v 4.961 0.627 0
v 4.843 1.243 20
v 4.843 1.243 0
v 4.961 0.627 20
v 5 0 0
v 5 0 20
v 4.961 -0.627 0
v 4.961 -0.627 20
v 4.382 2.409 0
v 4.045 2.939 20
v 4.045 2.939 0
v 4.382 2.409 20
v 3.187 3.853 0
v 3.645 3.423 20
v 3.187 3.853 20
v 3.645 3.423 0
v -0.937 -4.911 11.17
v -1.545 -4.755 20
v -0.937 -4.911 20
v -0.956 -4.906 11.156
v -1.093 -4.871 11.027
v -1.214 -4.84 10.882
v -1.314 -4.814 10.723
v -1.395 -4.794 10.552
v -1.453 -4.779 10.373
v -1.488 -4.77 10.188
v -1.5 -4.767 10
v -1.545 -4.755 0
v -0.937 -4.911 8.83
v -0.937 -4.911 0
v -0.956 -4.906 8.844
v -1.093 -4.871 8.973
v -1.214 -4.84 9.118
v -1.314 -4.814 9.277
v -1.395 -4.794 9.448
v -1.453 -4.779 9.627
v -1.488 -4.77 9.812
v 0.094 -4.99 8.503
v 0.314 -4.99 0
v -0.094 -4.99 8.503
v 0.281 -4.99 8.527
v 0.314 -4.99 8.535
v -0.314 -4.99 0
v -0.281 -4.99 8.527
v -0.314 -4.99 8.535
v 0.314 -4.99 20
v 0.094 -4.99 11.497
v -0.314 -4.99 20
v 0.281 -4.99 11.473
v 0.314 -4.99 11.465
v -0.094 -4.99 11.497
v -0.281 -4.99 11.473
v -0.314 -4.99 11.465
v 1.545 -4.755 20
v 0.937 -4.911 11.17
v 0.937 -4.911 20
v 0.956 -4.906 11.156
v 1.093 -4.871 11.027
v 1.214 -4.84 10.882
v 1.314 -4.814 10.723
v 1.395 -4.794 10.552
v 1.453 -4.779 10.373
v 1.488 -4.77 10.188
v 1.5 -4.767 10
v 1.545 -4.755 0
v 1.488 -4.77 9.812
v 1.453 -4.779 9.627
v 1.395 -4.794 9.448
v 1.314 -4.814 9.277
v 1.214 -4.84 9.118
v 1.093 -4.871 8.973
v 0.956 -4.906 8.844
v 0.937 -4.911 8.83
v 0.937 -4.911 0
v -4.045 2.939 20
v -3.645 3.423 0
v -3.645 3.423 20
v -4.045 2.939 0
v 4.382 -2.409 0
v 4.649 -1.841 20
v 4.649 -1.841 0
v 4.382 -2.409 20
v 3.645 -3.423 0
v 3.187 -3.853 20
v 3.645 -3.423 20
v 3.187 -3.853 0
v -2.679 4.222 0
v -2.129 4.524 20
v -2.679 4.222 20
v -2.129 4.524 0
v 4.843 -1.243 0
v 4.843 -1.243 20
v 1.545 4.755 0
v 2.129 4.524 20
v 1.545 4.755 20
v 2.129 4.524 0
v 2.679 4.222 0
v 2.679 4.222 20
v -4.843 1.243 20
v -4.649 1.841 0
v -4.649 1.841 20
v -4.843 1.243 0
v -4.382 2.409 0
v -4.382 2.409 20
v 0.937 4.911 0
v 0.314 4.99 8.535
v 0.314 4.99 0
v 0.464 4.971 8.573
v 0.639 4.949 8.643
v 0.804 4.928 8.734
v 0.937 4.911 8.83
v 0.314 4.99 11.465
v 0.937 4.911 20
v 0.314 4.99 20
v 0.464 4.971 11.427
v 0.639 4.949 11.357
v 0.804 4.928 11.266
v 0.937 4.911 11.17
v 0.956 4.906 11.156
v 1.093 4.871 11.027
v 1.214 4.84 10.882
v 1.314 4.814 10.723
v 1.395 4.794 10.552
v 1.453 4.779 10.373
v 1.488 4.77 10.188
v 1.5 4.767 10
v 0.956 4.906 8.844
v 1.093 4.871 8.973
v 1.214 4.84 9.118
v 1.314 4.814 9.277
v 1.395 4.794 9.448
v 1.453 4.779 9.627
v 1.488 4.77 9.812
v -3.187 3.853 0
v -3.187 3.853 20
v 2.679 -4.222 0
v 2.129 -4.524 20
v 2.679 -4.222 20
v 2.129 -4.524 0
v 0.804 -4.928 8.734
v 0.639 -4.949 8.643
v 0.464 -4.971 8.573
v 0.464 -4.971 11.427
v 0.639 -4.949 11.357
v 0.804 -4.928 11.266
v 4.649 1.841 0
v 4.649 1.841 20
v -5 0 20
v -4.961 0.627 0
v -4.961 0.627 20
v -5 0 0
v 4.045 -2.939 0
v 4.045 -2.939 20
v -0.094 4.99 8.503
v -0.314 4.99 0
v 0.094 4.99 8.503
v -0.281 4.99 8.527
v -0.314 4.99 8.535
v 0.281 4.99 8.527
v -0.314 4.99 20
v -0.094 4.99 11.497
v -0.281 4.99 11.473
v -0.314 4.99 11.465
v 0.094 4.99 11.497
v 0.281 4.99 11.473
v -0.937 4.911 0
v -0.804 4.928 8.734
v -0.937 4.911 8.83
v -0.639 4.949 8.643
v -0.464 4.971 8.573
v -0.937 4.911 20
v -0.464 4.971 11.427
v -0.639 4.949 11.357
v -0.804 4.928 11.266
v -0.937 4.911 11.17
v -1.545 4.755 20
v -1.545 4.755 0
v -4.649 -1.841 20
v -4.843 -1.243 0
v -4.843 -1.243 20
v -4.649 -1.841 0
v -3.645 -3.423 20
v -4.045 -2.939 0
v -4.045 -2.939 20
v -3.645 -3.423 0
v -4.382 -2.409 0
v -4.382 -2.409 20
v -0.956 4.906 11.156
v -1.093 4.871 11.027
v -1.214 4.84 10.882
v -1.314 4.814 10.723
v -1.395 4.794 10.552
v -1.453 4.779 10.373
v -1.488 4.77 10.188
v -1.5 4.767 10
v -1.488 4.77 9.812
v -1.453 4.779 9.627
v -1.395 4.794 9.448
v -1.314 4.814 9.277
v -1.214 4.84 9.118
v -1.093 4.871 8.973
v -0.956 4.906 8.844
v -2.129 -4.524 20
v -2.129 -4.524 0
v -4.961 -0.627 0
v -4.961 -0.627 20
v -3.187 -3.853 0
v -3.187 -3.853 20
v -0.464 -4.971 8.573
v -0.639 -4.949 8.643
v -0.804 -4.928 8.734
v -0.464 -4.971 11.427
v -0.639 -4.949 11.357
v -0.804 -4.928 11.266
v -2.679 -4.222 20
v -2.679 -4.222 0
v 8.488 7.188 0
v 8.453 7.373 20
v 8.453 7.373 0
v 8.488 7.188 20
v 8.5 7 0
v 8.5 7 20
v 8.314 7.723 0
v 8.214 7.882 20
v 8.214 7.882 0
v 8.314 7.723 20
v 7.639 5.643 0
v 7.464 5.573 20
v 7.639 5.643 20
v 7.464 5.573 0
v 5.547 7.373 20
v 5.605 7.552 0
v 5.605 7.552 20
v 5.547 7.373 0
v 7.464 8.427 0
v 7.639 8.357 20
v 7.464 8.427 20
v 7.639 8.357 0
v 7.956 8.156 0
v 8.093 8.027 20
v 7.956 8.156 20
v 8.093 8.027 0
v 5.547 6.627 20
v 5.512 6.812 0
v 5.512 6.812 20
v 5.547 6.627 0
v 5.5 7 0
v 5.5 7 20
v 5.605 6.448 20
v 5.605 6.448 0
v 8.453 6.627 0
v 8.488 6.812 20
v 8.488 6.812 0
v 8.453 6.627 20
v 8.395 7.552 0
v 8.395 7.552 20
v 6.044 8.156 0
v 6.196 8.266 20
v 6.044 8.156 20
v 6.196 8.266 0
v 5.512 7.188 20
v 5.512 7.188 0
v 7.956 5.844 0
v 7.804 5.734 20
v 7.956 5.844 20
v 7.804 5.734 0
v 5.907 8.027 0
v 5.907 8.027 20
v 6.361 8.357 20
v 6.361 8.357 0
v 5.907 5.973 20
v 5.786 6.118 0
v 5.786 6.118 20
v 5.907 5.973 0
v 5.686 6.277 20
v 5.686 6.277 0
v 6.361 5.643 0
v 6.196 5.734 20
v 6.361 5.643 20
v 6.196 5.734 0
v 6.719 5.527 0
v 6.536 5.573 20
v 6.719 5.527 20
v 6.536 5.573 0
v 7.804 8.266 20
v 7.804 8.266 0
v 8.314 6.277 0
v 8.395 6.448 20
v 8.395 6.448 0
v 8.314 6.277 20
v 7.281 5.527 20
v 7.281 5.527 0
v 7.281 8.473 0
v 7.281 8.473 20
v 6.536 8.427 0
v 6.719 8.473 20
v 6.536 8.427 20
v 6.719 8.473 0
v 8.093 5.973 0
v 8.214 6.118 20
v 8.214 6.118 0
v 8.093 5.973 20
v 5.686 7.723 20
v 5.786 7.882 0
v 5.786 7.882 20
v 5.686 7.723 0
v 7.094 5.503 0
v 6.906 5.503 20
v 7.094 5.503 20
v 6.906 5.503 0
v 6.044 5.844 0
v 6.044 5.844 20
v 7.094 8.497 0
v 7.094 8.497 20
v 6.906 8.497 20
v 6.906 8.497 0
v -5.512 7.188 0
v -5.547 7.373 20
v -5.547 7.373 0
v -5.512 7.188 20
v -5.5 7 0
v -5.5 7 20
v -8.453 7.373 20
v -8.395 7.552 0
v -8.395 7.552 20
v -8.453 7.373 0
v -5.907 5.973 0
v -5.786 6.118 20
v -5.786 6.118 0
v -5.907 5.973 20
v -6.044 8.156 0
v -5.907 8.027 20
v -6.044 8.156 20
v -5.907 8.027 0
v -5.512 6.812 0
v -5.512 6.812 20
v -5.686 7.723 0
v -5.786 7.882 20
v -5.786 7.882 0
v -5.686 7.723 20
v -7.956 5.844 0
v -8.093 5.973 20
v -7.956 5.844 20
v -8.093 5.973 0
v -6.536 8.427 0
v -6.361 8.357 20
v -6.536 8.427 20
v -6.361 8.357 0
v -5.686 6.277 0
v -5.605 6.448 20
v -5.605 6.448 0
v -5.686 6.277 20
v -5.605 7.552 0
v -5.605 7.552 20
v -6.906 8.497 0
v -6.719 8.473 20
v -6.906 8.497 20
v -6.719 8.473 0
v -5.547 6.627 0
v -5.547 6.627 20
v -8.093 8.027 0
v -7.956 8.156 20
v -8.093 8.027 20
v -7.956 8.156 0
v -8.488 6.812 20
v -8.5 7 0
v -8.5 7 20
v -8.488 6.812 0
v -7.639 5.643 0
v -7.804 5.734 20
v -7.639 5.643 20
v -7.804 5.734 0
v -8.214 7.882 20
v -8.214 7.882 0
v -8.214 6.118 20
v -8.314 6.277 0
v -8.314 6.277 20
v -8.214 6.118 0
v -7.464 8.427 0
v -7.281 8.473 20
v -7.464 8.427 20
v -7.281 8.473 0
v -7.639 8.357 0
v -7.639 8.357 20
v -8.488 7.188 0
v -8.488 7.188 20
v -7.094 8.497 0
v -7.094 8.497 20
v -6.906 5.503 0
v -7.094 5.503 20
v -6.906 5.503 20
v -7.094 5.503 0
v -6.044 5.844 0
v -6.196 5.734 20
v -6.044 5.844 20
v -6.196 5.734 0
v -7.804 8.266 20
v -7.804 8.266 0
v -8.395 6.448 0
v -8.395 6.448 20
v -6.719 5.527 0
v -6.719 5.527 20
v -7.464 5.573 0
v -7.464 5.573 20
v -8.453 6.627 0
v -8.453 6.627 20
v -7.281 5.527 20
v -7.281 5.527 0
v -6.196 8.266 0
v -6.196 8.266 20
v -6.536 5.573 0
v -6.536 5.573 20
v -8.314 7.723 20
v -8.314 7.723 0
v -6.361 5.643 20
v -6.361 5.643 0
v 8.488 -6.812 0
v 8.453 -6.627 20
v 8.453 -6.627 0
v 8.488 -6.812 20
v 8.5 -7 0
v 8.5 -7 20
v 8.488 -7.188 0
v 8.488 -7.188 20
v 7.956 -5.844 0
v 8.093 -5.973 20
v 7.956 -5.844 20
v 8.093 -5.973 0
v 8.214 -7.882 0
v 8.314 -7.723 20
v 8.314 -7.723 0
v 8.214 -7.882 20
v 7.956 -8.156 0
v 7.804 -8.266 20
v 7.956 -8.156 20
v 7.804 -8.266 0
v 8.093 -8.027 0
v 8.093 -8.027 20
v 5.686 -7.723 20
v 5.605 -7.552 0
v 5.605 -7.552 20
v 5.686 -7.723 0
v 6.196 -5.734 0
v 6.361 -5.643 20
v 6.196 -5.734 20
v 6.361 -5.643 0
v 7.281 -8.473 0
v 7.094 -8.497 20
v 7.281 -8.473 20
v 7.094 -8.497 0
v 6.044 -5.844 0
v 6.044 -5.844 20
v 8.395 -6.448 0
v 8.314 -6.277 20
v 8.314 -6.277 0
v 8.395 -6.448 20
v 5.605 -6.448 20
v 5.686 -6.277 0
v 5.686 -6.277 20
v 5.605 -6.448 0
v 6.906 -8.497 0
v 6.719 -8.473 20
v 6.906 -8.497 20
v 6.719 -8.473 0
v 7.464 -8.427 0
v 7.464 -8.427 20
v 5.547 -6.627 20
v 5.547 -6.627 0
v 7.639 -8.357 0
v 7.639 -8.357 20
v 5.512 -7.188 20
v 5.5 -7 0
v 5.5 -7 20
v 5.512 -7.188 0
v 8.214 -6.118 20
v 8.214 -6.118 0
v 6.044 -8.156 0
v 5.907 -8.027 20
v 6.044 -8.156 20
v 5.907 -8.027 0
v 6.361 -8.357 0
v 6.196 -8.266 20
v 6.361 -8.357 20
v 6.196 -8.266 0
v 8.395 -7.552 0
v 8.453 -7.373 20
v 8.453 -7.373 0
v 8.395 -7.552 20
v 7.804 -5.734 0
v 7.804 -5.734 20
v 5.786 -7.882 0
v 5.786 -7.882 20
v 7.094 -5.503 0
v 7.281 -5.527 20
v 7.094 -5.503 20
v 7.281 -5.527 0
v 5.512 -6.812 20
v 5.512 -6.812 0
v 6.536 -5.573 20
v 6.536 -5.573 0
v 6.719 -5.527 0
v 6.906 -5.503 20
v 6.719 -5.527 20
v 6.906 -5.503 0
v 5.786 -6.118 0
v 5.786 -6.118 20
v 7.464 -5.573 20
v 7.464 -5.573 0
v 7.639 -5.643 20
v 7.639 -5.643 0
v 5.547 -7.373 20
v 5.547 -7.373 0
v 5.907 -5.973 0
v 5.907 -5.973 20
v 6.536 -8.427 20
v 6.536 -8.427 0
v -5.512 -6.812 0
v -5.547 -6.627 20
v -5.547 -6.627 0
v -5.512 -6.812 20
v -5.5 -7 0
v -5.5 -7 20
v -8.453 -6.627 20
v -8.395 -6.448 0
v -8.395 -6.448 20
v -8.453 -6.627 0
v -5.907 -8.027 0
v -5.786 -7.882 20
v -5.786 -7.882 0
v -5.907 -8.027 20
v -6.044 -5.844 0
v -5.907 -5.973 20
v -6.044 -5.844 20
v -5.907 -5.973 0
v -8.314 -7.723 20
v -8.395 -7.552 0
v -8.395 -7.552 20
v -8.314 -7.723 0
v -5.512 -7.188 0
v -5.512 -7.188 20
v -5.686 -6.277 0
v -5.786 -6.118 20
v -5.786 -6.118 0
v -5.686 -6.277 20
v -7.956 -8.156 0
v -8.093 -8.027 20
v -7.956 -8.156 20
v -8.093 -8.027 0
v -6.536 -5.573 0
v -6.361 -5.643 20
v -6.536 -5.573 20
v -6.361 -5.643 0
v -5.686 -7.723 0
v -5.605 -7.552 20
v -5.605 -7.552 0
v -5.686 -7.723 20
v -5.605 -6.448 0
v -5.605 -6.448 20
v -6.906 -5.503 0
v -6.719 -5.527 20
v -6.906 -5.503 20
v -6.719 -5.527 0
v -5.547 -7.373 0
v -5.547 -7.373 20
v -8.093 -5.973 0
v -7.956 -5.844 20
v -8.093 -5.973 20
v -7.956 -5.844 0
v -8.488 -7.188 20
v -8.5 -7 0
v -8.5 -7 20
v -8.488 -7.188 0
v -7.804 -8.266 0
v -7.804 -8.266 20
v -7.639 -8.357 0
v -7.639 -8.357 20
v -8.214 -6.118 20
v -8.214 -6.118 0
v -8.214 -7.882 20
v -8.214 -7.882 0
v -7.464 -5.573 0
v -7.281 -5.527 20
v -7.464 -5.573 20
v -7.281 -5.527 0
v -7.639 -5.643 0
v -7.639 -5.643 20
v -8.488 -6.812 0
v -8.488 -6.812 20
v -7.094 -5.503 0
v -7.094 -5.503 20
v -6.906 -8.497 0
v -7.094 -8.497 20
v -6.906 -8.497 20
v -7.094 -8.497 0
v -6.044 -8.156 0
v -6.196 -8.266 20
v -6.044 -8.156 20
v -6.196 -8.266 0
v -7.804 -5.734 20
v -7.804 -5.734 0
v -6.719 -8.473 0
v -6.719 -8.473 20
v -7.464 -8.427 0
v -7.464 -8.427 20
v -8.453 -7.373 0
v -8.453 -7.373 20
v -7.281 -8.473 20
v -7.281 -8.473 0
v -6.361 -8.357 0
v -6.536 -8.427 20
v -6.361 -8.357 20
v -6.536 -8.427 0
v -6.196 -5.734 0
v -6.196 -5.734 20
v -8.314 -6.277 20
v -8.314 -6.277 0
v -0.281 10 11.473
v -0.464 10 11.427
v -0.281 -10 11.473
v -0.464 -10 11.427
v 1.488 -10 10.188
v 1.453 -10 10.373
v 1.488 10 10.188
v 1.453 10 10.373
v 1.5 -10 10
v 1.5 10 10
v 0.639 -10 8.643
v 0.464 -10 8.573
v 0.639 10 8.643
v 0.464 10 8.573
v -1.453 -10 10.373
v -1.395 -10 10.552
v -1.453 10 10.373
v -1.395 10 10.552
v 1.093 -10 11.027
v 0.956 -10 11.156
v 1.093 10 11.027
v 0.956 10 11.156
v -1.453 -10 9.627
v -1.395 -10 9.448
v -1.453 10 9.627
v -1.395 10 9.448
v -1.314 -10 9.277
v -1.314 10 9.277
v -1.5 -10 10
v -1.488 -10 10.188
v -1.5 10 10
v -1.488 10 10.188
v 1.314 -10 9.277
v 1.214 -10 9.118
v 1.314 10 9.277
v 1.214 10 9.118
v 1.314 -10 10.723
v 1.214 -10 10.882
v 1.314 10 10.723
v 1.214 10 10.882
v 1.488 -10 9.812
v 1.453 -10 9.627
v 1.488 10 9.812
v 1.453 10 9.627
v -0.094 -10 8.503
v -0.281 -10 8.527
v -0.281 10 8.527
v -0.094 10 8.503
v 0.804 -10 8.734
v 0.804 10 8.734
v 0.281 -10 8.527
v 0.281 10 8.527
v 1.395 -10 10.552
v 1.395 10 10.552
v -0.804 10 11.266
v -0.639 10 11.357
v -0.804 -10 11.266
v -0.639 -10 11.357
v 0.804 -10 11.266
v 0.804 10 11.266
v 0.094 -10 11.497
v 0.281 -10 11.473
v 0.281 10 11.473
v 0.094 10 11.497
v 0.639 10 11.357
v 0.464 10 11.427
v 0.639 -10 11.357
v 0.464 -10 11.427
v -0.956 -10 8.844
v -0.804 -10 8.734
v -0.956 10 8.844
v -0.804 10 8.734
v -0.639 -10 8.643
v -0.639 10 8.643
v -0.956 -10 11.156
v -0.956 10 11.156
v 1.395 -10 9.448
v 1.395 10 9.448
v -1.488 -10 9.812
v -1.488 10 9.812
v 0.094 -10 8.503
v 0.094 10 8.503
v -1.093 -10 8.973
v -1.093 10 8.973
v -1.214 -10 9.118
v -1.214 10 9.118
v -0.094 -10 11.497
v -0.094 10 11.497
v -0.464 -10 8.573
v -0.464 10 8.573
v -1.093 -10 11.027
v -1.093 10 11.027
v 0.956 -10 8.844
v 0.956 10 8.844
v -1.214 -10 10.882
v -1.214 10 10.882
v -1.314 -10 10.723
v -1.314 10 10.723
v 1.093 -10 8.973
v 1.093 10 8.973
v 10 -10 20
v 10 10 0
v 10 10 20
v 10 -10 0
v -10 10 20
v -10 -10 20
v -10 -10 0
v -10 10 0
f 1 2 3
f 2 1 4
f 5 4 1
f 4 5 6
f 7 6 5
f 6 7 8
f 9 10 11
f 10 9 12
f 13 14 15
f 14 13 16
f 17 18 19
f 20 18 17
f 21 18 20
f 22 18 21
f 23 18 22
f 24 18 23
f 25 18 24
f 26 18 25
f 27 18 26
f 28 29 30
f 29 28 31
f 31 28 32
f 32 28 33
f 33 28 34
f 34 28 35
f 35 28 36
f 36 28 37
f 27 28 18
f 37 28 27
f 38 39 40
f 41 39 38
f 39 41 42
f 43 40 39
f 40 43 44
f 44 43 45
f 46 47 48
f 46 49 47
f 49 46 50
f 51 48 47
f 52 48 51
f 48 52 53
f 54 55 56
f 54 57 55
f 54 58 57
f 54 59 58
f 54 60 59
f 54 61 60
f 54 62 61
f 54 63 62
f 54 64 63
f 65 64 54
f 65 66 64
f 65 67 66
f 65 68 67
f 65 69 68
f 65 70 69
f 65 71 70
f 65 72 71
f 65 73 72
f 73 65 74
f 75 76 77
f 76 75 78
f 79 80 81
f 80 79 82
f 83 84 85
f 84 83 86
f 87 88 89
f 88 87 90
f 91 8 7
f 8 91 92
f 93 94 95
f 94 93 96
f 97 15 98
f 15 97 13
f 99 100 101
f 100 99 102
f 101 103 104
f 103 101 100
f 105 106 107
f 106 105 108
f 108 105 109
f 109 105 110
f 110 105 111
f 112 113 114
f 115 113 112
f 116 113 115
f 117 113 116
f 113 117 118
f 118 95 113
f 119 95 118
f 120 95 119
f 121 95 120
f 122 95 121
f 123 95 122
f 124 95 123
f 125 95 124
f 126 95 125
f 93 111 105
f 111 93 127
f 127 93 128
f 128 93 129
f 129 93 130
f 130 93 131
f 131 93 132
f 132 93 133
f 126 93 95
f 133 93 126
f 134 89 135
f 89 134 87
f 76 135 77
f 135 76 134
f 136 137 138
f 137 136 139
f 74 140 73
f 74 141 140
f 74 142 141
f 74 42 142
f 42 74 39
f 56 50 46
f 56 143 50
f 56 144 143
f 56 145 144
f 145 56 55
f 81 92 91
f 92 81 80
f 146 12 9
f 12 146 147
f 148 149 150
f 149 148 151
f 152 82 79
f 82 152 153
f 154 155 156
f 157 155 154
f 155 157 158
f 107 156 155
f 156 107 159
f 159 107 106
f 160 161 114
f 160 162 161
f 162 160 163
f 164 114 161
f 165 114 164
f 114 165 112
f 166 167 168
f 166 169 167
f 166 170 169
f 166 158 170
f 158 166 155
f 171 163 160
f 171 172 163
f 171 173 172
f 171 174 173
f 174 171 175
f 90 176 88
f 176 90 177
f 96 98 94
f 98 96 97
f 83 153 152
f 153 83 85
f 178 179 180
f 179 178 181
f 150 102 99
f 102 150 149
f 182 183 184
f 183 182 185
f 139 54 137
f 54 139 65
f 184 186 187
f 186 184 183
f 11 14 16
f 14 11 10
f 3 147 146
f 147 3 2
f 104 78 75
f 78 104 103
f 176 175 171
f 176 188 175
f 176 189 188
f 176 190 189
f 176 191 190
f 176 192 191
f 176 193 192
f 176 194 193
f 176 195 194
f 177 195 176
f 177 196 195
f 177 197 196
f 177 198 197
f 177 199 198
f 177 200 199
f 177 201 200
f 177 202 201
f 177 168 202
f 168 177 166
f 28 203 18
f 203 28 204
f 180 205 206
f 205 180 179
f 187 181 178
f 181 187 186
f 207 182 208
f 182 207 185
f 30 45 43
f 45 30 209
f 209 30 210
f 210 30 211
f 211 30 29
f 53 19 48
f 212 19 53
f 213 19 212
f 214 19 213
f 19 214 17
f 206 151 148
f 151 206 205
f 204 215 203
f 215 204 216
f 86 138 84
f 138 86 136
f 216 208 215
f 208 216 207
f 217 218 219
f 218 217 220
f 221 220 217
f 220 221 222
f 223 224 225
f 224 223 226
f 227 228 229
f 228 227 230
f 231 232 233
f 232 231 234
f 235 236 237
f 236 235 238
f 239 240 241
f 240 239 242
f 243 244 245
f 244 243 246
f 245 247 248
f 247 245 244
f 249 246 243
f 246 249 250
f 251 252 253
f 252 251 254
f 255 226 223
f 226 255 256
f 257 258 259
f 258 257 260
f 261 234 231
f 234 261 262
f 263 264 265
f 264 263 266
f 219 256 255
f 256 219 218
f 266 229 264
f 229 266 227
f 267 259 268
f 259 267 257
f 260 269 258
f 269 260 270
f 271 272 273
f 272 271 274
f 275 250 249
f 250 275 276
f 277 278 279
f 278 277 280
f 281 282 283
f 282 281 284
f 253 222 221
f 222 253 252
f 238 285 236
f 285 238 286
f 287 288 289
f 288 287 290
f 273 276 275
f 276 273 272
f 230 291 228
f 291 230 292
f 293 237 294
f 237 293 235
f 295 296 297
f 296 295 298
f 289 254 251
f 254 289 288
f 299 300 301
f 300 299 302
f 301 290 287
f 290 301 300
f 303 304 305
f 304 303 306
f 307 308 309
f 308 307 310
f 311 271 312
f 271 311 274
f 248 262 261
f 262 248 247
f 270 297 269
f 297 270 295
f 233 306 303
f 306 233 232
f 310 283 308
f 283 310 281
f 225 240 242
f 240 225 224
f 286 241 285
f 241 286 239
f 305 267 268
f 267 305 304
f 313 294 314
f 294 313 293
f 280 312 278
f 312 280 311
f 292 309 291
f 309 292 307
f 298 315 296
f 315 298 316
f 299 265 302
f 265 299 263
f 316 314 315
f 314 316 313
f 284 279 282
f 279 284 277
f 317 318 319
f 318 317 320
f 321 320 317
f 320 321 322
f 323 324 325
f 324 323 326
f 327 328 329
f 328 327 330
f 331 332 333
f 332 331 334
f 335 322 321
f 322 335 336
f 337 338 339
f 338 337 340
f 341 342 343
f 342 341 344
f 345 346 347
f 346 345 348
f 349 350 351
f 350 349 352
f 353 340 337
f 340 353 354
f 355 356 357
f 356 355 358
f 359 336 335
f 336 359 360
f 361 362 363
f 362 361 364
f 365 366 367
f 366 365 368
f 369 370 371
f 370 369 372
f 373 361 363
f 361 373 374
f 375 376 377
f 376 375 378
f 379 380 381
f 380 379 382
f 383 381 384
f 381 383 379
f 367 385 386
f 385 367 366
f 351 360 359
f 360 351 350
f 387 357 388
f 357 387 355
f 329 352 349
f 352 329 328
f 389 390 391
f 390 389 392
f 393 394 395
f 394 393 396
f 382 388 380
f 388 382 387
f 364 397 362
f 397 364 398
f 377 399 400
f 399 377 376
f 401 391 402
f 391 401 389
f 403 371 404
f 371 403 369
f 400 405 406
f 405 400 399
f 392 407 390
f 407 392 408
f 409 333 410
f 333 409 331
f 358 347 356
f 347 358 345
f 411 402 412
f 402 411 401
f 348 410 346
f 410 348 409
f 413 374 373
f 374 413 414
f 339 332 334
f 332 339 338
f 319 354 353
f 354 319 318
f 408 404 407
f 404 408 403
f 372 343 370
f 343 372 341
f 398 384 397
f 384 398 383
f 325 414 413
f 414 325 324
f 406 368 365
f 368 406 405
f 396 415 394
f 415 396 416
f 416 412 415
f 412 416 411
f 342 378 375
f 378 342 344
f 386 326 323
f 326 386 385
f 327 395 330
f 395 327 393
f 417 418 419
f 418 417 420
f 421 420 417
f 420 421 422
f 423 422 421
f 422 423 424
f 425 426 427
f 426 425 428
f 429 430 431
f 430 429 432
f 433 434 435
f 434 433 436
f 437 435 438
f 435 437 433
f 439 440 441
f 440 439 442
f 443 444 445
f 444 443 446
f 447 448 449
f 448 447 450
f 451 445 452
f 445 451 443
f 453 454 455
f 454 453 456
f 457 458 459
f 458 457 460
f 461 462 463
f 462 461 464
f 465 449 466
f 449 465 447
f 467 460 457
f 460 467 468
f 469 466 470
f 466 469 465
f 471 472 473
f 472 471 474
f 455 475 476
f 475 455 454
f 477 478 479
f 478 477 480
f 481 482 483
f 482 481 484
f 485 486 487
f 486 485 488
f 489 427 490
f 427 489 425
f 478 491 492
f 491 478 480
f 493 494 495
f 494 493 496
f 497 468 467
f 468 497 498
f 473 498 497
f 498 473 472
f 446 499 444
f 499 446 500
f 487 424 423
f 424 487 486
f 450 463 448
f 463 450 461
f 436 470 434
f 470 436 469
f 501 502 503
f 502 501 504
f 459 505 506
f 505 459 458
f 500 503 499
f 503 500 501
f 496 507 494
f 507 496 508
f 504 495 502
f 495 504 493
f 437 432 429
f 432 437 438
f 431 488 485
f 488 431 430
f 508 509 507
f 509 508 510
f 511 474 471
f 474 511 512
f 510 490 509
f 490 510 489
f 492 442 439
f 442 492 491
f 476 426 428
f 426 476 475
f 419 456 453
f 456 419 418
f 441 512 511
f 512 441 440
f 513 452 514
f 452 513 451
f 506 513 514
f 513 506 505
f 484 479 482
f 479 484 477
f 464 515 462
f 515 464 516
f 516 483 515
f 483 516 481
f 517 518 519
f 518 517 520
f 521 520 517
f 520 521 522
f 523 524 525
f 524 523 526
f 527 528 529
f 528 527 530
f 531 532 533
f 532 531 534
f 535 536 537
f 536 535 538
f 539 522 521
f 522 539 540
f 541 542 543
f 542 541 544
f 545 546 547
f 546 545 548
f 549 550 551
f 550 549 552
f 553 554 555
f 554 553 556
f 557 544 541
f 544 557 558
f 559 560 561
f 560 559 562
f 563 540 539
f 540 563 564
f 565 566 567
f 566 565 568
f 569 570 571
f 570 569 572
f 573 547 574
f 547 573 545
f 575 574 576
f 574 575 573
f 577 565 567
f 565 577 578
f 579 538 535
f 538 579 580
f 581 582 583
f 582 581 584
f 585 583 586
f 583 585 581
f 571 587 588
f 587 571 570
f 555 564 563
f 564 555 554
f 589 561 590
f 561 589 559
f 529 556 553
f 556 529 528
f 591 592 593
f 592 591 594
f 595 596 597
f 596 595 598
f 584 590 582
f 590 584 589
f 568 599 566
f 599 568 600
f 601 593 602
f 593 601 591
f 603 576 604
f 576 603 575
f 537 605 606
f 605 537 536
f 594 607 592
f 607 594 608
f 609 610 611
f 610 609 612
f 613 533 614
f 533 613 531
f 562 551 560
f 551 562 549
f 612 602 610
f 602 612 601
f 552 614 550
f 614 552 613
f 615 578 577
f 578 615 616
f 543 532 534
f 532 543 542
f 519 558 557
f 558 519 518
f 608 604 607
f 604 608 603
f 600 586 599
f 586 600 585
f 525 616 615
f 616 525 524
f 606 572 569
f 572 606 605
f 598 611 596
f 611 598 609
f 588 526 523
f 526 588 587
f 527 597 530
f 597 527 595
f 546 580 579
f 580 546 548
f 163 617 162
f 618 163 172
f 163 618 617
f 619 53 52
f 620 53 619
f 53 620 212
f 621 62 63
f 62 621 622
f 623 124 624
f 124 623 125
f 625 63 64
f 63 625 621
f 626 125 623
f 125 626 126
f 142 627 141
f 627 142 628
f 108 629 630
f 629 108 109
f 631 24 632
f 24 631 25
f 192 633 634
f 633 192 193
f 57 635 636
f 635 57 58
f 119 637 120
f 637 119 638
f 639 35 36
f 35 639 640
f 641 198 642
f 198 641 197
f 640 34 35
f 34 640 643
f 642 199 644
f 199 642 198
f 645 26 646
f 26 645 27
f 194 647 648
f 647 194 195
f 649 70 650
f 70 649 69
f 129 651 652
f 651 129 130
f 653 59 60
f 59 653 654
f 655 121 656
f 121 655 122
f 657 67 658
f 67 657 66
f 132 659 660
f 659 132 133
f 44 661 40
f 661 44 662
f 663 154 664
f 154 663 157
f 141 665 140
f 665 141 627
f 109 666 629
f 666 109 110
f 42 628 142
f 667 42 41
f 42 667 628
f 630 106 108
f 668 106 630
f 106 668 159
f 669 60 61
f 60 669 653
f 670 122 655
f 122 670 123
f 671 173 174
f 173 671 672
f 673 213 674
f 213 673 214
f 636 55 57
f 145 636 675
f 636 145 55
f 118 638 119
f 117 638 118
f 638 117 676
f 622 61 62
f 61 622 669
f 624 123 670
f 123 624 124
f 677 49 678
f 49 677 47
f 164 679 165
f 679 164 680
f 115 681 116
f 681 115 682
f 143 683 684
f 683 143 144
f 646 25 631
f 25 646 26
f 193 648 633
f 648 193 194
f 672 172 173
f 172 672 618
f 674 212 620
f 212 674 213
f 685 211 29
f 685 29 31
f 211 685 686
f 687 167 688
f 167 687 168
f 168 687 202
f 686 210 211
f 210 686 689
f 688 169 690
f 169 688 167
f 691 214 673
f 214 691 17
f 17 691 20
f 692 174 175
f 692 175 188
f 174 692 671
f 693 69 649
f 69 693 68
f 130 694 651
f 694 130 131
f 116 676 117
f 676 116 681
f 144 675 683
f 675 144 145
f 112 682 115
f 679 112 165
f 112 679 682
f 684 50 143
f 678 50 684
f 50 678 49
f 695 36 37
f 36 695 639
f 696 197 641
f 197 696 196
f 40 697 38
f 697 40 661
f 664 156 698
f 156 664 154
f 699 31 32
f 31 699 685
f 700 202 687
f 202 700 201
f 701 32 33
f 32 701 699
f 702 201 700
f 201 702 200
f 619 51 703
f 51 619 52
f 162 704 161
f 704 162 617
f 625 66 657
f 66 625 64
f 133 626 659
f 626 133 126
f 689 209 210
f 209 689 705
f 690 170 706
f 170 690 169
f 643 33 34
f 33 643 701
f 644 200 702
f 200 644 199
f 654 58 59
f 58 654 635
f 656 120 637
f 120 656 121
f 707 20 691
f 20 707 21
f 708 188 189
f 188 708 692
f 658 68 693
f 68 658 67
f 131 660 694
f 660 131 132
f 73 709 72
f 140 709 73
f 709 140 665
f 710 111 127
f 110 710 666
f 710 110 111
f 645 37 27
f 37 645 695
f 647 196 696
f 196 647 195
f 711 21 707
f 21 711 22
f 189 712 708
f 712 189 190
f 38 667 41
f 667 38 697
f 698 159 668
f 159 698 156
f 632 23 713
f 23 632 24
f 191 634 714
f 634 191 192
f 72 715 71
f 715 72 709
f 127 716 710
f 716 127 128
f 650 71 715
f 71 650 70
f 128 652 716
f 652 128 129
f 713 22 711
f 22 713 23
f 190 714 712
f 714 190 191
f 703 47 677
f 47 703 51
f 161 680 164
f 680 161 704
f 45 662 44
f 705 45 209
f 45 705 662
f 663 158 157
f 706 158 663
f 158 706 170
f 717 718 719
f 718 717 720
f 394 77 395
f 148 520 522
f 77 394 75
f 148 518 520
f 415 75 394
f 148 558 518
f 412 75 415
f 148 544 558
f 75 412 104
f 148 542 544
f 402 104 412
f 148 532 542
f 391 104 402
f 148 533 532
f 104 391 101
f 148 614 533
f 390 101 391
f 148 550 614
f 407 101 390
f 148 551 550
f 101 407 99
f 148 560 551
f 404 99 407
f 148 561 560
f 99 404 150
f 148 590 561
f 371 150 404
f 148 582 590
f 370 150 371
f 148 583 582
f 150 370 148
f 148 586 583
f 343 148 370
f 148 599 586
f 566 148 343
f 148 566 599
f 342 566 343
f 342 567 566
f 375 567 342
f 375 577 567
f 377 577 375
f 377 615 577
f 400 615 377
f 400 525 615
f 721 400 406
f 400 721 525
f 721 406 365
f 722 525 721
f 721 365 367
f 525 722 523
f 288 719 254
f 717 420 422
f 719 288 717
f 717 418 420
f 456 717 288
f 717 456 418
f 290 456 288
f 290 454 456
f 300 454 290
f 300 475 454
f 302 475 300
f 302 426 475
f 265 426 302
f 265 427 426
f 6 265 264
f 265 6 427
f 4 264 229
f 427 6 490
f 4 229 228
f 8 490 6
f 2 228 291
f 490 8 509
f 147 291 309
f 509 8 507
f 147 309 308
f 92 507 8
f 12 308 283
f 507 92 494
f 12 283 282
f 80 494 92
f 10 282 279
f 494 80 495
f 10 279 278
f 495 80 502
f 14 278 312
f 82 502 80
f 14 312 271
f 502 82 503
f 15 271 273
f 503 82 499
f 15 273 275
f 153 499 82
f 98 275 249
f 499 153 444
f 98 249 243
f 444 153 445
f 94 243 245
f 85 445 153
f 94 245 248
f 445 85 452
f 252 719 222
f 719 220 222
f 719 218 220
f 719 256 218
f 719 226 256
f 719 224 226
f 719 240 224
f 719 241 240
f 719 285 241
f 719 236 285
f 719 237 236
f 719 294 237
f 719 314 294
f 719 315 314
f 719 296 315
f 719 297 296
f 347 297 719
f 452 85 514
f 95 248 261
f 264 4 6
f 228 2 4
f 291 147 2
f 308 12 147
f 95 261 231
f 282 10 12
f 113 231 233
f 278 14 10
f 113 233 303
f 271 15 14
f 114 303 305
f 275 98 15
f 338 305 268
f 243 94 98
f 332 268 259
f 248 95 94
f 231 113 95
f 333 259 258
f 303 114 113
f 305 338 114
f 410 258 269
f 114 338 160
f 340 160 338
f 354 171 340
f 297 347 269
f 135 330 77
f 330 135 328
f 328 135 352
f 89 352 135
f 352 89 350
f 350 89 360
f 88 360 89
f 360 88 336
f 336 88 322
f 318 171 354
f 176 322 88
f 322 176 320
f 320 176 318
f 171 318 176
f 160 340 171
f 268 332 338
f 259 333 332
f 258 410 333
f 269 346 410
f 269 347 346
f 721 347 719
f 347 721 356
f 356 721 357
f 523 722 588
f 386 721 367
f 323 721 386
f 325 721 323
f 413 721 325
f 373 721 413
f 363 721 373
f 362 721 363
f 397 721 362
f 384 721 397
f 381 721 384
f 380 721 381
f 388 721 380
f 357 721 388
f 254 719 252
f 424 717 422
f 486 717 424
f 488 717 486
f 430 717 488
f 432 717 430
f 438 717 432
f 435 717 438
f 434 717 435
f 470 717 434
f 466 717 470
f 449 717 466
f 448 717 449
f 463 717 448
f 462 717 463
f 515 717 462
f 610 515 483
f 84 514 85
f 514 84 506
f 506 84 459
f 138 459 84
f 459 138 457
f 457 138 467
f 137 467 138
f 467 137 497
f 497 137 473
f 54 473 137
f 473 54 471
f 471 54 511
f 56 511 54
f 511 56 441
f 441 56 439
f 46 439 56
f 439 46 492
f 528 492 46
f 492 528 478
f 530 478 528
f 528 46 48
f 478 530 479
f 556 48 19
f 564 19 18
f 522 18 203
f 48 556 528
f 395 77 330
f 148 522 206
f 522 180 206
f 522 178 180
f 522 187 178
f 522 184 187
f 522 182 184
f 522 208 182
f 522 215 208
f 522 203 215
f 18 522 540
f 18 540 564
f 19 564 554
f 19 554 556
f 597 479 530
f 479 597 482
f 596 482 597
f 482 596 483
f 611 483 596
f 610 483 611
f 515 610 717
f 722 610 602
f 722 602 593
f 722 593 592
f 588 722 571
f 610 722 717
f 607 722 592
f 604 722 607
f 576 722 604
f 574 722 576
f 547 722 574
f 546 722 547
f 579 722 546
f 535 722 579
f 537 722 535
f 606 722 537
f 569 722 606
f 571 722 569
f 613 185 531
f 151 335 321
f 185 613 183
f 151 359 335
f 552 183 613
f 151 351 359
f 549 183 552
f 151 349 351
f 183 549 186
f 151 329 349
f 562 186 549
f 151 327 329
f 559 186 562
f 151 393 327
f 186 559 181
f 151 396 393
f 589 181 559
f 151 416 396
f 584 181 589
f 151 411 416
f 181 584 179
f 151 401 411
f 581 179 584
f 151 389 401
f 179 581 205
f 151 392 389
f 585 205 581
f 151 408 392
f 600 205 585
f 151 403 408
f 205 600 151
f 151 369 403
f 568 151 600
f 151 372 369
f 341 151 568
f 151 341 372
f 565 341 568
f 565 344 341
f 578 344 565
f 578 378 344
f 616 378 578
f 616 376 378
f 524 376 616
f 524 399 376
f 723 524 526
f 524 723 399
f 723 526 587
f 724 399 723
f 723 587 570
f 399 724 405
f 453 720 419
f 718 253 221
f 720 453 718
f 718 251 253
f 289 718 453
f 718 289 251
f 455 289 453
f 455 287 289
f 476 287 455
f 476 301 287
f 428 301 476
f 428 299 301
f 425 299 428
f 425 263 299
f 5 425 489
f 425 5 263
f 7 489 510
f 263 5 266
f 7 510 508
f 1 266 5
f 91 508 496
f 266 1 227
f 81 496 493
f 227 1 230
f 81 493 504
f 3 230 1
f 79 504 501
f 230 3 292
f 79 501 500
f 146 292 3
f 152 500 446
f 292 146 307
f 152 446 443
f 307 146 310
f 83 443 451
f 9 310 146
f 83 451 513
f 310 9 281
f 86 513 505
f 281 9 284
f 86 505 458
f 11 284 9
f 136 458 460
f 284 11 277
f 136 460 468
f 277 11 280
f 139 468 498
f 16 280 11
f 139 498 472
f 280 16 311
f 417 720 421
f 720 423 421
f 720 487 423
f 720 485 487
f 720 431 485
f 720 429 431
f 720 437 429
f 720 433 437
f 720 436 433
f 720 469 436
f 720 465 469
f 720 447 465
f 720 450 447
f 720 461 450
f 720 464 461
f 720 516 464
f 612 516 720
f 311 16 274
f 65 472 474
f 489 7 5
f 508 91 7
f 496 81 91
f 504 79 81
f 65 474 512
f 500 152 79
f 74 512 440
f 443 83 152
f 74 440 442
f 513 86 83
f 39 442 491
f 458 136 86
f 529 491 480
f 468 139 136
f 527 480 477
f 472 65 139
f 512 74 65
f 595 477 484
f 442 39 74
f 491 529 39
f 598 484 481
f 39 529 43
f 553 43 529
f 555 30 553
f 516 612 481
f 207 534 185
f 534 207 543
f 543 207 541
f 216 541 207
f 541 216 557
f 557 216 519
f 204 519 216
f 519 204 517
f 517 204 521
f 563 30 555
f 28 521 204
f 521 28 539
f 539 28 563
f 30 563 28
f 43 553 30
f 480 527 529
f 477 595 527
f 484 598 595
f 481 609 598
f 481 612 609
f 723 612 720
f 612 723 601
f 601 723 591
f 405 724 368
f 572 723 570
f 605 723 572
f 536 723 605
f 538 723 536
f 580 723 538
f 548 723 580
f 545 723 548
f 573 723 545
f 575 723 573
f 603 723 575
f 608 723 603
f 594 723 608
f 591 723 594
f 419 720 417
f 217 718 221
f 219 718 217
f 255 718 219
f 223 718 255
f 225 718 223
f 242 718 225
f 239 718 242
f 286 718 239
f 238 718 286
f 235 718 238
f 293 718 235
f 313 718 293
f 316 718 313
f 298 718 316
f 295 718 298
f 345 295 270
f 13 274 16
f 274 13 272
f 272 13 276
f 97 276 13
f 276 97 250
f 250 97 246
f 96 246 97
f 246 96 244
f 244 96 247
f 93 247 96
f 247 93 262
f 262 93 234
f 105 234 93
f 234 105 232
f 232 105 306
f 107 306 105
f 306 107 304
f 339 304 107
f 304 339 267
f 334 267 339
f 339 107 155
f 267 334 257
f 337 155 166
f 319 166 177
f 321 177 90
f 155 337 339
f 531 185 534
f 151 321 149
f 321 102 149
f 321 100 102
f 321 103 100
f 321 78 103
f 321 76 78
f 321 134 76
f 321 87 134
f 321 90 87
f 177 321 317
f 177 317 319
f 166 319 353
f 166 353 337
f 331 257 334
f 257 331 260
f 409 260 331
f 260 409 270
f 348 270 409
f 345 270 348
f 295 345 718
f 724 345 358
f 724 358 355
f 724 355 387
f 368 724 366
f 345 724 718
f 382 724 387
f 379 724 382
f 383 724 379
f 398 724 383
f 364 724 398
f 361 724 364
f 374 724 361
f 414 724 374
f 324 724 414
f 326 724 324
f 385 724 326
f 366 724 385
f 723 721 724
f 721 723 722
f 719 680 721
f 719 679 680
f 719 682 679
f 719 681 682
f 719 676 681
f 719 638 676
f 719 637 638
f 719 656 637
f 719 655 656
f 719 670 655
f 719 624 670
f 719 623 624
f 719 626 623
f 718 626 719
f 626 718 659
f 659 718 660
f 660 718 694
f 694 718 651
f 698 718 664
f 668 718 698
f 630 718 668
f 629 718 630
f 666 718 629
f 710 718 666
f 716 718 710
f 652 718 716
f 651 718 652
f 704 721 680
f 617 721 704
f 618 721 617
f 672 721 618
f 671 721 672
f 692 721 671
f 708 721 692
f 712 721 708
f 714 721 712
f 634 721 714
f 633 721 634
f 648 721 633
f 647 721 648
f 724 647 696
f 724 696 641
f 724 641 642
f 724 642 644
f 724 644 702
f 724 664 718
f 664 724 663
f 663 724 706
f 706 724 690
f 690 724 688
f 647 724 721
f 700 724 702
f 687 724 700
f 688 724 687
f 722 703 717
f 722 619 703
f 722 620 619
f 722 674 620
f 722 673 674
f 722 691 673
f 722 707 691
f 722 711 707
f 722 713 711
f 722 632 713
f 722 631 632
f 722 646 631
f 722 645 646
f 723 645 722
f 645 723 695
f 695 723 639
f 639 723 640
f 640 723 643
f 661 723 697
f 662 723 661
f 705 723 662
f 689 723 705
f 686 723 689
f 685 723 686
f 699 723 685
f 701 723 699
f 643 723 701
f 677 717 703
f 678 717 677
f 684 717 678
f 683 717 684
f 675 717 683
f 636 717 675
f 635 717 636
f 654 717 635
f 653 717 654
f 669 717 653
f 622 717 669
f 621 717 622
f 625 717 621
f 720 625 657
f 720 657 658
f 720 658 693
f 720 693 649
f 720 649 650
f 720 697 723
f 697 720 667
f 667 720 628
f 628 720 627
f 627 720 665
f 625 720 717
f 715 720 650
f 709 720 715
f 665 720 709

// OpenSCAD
// diameter of the rod
rod_dia     = 10;

// diameter of the screw holes
screw_dia   = 3;

// linear distance between the vertical screw holes
screw_dist  = 14;

// width (x and y) of the block
cube_width  = 20;

// height of the block
cube_height = 20;

difference()
{
  translate([-cube_width/2,-cube_width/2,0]) cube(size=[cube_width,cube_width,cube_height]);  
  union()
  {  
    translate([0,0,cube_height/2]) cylinder(h=cube_height+2,r1=rod_dia/2,r2=rod_dia/2,center=true, $fn=50);
// vert screw holes
    translate([screw_dist/2,screw_dist/2,cube_height/2]) cylinder(h=cube_height+2,r1=screw_dia/2,r2=screw_dia/2,center=true, $fn=50);
    translate([-screw_dist/2,screw_dist/2,cube_height/2]) cylinder(h=cube_height+2,r1=screw_dia/2,r2=screw_dia/2,center=true, $fn=50);
    translate([screw_dist/2,-screw_dist/2,cube_height/2]) cylinder(h=cube_height+2,r1=screw_dia/2,r2=screw_dia/2,center=true, $fn=50);
    translate([-screw_dist/2,-screw_dist/2,cube_height/2]) cylinder(h=cube_height+2,r1=screw_dia/2,r2=screw_dia/2,center=true, $fn=50);
// hor screw hole      
    translate([0,0,cube_height/2]) rotate([90,0,0]) cylinder(h=cube_width+2,r1=screw_dia/2,r2=screw_dia/2,center=true, $fn=50);
  }    
}
